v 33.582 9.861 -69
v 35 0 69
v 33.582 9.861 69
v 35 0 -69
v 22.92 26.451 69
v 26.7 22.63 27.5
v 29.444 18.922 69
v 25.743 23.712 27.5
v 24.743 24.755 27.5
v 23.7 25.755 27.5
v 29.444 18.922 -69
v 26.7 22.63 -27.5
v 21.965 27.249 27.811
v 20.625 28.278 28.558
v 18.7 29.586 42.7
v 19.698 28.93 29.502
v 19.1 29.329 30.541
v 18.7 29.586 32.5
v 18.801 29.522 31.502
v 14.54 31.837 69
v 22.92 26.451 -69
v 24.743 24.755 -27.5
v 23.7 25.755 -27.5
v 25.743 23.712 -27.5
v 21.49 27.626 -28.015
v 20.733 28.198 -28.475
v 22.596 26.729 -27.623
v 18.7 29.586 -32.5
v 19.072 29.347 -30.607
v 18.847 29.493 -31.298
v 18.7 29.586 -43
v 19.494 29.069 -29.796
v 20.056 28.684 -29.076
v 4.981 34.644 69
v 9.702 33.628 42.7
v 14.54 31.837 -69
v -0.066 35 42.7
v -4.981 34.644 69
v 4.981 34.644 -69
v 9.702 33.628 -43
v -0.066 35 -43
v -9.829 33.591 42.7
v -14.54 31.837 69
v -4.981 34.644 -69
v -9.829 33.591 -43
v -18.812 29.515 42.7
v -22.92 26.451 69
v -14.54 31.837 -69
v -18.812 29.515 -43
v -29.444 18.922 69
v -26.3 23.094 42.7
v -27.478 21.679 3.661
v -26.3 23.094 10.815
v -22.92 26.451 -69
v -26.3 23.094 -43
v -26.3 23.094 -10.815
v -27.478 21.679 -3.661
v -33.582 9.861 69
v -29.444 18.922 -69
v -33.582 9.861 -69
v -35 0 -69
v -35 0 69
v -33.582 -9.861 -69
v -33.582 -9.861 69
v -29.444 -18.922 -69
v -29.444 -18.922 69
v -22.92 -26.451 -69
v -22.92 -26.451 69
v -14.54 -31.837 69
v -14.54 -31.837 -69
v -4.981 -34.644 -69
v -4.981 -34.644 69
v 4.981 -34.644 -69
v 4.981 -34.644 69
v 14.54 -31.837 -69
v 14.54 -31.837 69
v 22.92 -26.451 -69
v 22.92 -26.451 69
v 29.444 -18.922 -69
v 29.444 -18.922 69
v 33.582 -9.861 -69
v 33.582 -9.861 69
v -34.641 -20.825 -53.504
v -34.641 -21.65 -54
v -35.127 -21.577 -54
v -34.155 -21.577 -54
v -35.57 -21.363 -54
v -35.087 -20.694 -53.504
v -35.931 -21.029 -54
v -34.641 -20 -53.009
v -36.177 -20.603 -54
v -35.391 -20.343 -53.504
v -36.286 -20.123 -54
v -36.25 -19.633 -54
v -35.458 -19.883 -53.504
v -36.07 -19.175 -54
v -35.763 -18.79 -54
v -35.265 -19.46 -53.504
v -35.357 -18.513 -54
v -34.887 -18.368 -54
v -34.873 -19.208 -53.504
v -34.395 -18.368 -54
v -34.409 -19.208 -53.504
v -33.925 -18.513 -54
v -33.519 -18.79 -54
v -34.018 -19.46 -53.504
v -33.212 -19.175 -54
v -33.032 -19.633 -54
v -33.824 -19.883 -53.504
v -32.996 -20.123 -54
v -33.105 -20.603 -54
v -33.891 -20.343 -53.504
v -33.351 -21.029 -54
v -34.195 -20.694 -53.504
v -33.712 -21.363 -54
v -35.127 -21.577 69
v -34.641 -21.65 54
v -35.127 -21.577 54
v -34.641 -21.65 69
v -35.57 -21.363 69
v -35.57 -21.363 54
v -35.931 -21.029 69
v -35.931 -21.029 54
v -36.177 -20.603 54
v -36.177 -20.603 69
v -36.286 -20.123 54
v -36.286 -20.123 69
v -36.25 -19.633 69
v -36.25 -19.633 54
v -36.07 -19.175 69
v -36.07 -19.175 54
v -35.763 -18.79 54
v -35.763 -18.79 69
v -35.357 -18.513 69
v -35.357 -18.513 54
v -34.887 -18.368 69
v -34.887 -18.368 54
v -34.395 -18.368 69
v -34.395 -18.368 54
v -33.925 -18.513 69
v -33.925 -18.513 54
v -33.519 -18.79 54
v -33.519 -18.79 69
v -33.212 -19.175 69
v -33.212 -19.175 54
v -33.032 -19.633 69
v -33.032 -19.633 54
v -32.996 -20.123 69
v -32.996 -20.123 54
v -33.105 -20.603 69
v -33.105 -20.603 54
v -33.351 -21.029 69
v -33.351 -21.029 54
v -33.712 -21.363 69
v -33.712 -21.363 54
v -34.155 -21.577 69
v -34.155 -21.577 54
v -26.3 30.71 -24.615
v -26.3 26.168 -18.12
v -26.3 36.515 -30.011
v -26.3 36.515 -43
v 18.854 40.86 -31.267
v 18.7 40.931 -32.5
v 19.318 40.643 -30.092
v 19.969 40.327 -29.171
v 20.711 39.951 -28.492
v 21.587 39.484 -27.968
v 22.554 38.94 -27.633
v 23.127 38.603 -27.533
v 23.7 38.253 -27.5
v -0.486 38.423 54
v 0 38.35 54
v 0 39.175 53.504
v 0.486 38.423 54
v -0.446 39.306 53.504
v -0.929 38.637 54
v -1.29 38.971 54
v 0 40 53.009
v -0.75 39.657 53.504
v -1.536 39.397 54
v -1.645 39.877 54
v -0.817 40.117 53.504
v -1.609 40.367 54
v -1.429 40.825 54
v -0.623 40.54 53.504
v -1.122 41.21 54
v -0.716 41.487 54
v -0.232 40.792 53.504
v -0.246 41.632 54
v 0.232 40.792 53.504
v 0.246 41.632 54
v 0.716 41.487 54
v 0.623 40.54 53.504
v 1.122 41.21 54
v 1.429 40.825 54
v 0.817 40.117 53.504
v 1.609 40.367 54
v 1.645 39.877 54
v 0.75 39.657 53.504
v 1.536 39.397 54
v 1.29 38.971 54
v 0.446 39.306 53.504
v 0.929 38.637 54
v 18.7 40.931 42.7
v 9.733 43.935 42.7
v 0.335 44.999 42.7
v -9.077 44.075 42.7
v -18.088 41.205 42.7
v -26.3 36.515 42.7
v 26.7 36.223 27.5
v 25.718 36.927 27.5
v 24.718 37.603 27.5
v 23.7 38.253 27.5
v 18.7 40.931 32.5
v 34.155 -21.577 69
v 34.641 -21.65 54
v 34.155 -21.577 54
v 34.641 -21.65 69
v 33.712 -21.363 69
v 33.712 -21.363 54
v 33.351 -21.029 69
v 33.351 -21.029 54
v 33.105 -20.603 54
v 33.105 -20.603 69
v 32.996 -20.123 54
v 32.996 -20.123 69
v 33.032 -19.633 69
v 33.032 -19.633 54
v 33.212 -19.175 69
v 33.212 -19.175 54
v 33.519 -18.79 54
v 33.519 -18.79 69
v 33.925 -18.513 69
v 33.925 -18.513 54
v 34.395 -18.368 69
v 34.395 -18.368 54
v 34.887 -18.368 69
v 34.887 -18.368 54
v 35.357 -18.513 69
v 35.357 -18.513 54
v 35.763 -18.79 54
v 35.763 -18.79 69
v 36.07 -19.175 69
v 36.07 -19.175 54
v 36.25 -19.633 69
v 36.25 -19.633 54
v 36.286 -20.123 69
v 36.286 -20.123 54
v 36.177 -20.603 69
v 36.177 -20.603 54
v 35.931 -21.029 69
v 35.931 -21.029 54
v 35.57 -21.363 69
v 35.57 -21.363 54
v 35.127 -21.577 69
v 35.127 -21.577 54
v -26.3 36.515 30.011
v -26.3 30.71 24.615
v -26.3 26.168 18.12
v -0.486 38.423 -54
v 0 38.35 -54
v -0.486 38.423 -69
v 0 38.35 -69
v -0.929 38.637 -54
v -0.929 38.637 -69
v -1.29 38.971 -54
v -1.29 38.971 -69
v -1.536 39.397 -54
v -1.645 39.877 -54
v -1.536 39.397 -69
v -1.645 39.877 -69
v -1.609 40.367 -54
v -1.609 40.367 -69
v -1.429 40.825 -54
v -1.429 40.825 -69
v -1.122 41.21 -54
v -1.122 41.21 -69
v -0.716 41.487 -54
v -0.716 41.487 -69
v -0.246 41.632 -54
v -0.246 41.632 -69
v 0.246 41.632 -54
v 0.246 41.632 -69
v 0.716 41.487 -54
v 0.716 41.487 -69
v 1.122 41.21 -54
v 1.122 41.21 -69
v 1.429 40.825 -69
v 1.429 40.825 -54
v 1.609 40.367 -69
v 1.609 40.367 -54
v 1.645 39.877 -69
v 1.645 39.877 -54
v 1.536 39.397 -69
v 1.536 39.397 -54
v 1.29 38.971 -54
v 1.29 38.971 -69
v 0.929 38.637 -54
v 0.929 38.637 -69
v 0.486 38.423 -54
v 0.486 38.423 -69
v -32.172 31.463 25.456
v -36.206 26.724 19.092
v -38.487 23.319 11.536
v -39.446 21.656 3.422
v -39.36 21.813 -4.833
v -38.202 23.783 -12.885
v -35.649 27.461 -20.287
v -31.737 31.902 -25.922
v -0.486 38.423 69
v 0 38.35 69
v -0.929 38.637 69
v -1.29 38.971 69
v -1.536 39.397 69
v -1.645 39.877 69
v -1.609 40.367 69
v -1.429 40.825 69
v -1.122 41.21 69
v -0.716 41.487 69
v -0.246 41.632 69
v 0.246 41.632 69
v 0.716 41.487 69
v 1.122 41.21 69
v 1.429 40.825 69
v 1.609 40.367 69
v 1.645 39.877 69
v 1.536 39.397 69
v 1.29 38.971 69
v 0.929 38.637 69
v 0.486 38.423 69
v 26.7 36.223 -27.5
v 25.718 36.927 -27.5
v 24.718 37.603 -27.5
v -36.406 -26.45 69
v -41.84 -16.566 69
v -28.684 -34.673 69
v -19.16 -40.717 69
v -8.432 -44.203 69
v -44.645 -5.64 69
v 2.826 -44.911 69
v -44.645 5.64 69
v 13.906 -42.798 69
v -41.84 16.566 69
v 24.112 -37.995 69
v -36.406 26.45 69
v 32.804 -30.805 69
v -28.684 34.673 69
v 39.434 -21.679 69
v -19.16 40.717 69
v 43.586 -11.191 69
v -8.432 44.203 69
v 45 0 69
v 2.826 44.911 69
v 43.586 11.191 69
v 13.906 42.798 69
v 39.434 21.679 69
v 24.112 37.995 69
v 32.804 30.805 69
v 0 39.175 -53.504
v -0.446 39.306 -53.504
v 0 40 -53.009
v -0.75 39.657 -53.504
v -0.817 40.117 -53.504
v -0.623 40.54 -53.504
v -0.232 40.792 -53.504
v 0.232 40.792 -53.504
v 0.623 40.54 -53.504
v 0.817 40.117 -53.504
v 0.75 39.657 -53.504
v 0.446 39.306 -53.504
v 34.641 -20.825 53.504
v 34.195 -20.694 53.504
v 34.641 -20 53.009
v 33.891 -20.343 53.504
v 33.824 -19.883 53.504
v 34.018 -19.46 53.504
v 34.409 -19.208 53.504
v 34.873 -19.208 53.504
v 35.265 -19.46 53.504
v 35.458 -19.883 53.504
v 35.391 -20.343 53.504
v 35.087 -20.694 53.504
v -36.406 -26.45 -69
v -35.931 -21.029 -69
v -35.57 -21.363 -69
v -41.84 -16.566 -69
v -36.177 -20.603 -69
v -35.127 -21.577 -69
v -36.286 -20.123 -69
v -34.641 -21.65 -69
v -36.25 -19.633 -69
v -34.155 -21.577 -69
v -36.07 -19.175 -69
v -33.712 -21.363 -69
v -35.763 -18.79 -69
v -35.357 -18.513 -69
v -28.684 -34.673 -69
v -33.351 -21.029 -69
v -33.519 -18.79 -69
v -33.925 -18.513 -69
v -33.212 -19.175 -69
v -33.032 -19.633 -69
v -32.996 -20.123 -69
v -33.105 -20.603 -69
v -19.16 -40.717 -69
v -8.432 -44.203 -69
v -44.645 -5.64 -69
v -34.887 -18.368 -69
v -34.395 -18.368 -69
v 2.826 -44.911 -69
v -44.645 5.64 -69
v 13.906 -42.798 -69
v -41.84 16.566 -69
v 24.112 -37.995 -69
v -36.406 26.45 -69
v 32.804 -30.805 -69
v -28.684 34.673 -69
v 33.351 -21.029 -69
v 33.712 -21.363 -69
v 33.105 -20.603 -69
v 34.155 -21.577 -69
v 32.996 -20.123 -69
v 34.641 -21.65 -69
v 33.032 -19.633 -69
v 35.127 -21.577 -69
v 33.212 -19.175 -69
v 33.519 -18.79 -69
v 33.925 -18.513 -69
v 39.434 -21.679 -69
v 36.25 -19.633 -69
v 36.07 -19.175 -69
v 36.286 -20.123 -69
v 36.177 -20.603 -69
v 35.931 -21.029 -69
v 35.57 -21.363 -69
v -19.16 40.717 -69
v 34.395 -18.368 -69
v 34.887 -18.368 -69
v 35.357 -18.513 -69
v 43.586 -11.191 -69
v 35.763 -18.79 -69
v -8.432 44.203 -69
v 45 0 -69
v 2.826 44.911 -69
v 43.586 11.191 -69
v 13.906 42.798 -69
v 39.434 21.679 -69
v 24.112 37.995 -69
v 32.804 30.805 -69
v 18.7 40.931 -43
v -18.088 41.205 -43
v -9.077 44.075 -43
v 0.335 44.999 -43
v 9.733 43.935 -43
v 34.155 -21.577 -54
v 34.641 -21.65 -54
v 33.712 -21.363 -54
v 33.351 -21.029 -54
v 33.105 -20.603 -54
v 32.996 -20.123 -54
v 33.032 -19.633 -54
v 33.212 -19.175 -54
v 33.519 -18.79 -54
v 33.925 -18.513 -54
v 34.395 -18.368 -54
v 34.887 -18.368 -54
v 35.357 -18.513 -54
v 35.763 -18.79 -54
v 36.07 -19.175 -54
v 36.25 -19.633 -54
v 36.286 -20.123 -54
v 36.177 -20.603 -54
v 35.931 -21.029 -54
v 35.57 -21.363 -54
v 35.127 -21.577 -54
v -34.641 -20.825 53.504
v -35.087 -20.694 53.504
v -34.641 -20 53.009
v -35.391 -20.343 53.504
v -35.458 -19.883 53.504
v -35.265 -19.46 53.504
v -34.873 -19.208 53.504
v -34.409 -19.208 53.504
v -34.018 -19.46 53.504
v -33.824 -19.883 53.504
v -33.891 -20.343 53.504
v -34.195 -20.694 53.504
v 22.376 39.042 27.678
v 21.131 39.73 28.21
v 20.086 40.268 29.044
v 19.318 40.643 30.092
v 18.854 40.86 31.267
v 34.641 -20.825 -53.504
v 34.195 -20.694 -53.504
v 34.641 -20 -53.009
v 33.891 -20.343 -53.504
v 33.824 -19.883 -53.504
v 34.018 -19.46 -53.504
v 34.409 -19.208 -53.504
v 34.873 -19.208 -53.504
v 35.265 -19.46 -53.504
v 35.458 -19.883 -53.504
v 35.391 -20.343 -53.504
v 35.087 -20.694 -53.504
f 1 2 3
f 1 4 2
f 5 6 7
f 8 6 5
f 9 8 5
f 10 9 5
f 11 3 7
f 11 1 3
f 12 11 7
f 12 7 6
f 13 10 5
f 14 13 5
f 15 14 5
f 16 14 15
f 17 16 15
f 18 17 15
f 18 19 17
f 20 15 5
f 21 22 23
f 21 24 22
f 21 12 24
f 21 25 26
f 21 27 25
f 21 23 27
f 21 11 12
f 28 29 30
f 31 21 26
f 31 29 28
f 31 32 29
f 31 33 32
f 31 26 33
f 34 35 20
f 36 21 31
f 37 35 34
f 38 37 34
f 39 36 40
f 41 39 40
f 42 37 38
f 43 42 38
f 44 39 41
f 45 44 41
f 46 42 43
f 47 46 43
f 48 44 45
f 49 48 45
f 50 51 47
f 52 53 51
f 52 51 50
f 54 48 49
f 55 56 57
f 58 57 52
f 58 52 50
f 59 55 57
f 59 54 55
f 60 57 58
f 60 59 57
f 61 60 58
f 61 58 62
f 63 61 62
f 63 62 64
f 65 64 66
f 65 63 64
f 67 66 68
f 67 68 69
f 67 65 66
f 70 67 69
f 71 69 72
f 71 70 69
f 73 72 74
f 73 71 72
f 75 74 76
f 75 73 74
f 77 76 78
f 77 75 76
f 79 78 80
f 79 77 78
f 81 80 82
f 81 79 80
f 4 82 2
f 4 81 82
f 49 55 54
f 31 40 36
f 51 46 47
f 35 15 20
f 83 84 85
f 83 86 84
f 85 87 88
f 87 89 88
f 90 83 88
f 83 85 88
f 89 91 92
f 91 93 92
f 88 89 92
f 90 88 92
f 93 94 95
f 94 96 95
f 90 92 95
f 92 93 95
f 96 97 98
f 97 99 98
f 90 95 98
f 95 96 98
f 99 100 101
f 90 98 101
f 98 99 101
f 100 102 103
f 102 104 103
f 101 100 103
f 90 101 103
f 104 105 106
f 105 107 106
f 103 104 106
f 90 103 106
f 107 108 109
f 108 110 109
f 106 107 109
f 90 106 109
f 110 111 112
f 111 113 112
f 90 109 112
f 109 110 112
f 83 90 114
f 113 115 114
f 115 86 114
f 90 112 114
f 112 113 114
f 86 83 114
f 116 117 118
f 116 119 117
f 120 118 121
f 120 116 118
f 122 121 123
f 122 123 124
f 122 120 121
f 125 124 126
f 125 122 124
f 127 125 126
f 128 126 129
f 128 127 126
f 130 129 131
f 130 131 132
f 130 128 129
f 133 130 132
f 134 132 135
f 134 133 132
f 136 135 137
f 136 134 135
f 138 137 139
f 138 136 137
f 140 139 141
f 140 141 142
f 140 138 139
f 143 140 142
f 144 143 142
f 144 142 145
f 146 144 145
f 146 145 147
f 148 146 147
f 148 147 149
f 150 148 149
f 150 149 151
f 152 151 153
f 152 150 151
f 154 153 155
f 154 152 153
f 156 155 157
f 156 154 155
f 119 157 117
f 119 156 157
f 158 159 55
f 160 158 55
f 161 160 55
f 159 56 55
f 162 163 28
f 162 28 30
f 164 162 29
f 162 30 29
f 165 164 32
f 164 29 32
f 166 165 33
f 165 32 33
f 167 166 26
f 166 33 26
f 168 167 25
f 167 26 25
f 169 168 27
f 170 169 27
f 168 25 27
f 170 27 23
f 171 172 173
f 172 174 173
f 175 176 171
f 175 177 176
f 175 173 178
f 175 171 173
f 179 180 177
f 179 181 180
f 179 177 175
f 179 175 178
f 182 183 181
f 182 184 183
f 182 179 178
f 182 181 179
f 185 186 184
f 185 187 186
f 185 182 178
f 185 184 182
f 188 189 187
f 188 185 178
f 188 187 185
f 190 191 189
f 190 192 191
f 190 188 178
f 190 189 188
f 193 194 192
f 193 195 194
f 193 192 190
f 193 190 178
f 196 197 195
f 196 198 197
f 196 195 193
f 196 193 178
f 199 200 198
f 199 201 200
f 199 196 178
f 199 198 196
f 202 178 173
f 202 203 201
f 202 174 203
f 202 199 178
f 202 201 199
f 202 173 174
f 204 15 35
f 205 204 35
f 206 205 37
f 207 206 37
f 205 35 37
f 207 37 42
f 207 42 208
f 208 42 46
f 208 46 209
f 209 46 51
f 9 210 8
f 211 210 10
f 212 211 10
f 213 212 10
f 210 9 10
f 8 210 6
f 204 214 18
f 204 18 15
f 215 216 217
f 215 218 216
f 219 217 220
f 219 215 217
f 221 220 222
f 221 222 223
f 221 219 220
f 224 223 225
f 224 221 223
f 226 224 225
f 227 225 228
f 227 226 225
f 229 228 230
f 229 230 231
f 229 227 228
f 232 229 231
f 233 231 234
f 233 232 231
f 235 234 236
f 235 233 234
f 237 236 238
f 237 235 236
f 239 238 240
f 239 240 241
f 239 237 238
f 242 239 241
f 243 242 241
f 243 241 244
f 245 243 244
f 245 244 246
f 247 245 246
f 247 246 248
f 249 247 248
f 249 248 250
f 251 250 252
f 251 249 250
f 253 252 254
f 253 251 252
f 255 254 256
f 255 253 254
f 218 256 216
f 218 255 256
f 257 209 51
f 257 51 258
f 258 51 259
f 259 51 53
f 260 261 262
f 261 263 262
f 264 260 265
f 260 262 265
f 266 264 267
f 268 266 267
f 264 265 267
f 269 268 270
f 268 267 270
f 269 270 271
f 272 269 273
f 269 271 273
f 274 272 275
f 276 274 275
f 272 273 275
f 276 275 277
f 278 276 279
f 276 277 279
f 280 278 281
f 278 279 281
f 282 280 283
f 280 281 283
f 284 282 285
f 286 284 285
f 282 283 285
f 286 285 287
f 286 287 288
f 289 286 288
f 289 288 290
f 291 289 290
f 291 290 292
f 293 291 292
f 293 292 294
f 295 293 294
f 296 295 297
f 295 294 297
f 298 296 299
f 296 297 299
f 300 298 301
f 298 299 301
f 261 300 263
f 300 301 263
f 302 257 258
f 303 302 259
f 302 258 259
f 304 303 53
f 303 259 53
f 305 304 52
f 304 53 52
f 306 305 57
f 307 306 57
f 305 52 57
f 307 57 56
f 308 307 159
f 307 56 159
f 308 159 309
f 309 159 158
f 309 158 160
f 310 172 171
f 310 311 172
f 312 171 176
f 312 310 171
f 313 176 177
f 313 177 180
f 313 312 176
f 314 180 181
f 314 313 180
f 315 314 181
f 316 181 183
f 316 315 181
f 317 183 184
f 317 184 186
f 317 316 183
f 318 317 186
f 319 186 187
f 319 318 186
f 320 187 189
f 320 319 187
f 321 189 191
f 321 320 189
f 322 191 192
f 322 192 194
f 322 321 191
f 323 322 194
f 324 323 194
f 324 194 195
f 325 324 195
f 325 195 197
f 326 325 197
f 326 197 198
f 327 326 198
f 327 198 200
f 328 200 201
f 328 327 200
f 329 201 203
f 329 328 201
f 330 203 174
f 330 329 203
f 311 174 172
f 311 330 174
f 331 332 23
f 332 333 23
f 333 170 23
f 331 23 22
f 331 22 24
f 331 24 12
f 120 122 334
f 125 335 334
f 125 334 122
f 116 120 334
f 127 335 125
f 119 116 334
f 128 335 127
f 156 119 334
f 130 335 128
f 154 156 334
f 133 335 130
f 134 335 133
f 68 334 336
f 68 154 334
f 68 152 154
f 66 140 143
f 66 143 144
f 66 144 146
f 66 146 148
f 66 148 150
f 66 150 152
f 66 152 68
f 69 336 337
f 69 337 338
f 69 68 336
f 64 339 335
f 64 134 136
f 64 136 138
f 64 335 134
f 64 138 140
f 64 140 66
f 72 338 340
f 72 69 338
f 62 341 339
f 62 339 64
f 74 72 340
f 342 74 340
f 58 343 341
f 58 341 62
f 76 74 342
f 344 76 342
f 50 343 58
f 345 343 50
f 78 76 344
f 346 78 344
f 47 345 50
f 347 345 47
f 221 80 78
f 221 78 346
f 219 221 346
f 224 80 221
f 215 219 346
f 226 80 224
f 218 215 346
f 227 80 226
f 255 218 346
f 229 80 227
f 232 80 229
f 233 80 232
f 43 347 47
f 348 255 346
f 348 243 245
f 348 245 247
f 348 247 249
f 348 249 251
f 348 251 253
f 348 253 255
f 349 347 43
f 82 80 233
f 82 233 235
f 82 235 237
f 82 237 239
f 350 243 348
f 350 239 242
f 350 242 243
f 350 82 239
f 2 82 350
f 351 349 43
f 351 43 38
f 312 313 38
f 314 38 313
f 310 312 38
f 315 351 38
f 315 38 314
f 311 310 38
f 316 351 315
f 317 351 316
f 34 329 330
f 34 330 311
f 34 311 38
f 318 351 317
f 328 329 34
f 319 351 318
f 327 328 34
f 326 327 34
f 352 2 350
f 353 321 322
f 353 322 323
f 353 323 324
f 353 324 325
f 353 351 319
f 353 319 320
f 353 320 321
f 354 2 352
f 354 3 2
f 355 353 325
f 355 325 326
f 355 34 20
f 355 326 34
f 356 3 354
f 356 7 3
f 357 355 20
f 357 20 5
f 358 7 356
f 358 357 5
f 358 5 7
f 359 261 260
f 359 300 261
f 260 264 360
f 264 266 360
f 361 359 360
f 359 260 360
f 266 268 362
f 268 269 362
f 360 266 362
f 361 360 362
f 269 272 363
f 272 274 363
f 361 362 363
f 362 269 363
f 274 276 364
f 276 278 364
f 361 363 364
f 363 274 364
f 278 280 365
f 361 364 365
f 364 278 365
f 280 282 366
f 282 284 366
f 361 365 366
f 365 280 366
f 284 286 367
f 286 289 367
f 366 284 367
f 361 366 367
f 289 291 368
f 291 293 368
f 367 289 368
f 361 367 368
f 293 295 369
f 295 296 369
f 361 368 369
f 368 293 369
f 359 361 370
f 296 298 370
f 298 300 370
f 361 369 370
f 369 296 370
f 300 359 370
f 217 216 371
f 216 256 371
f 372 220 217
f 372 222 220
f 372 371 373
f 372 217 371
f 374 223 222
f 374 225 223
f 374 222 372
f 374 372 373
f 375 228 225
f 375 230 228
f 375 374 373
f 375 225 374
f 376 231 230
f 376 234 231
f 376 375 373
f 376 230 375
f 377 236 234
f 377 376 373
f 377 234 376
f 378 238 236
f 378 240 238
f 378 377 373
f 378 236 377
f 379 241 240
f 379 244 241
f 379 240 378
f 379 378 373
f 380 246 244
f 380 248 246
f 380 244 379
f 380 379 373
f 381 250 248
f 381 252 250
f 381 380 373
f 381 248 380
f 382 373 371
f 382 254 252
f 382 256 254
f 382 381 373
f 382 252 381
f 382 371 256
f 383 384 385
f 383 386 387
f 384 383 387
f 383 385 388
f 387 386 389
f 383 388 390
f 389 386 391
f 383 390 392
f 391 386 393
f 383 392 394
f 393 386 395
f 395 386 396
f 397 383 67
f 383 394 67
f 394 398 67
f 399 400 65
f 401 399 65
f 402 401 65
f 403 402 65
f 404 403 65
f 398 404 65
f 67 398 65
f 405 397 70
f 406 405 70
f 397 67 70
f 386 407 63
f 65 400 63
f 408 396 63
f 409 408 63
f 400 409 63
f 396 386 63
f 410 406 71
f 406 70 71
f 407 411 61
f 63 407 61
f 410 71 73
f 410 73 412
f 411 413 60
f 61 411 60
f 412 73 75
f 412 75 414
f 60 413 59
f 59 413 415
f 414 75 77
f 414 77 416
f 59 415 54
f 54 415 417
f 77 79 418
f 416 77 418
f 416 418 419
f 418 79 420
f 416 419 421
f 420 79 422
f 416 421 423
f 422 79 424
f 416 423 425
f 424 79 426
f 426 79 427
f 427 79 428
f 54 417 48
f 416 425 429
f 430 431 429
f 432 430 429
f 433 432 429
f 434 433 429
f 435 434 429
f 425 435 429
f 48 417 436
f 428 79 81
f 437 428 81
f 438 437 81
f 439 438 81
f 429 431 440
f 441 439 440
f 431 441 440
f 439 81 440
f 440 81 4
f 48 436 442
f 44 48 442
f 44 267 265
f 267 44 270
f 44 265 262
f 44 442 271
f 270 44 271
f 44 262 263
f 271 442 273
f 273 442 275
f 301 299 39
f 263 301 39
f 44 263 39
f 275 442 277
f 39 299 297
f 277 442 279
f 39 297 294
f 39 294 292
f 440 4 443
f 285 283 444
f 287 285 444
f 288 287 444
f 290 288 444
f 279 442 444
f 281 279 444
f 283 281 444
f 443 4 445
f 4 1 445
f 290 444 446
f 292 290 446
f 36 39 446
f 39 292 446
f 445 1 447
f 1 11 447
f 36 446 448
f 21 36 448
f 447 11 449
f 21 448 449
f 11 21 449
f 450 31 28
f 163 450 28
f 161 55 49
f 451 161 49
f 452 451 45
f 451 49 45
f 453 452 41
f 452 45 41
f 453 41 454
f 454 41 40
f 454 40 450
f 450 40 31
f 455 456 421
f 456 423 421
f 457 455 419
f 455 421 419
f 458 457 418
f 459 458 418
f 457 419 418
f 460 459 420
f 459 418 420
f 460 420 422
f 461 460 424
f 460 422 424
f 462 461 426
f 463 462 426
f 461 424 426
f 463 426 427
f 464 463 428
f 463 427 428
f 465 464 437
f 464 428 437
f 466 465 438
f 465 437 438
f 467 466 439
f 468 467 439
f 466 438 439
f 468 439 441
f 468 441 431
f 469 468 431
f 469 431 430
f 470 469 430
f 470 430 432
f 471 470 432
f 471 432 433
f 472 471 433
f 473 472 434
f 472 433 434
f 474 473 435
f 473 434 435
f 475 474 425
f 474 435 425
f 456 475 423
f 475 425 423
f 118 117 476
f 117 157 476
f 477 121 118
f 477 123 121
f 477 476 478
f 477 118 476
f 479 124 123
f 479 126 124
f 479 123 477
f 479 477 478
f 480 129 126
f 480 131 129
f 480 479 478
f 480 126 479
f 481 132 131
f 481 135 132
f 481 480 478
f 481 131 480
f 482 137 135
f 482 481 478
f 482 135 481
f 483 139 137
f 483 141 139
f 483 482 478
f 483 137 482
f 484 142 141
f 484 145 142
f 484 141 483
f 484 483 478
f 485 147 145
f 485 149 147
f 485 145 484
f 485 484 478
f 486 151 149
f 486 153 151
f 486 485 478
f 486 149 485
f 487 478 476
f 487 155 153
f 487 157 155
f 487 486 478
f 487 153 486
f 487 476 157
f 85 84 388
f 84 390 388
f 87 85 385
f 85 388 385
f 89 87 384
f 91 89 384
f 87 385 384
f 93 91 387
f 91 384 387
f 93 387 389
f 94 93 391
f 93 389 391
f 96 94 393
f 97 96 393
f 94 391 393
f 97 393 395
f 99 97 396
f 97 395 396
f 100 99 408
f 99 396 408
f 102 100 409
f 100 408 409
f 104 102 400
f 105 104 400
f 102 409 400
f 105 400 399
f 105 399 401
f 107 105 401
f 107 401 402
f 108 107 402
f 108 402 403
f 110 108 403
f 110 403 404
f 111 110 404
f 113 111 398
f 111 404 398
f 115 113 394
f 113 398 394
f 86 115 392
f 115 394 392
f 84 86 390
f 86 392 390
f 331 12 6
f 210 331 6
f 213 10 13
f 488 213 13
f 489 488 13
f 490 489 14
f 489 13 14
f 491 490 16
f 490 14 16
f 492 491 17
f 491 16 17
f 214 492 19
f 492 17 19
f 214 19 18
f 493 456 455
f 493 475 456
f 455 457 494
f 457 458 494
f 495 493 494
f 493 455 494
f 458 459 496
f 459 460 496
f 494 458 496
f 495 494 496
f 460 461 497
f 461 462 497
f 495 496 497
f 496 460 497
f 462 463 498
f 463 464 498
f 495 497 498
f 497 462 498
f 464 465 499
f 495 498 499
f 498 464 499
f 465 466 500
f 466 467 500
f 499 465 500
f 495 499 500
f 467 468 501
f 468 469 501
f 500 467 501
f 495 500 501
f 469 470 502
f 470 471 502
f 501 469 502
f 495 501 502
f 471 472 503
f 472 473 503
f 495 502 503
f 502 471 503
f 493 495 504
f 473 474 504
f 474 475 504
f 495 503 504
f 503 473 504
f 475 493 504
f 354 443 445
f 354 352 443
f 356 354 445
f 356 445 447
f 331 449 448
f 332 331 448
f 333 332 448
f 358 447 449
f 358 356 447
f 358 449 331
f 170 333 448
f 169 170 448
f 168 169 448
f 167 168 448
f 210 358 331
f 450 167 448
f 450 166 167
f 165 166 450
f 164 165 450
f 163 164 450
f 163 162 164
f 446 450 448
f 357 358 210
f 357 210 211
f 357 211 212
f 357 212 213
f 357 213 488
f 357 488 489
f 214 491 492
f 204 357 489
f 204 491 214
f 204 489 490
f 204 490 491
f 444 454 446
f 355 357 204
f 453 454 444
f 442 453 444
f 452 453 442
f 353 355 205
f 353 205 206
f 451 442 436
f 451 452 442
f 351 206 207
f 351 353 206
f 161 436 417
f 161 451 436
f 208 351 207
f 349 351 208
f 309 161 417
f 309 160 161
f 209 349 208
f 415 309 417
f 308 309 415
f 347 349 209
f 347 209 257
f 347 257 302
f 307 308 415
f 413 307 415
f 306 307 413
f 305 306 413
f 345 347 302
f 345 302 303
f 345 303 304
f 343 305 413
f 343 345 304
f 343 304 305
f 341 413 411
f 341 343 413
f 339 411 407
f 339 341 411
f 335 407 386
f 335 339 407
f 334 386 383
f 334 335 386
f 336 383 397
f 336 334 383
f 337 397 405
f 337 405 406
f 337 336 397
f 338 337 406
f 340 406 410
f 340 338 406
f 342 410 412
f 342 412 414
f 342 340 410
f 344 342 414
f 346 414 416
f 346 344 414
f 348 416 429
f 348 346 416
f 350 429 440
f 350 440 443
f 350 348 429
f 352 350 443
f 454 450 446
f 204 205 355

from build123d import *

# Parameters (mm, degrees)
CROQUIS1_R                     = 45
CROQUIS1_R_2                   = 35
SALIENTE_EXTRUIR1_DEPTH        = 69
CORTAR_EXTRUIR1_DEPTH          = 138
CROQUIS3_R                     = 37.5
CORTAR_EXTRUIR2_DEPTH          = 138
TALADRO_ROSCADO_M41_AT_2_COUNT = 2
TALADRO_ROSCADO_M41_AT_2_PITCH = 69.282032303
TALADRO_ROSCADO_M41_AT_3_COUNT = 2
TALADRO_ROSCADO_M41_AT_3_PITCH = 69.282032303


with BuildPart() as part:
    # Croquis1 → Saliente-Extruir1 (new body, symmetric)
    with BuildSketch(Plane.XY):
        Circle(CROQUIS1_R)
        Circle(CROQUIS1_R_2, mode=Mode.SUBTRACT)
    extrude(amount=SALIENTE_EXTRUIR1_DEPTH, both=True)

    # Croquis2 → Cortar-Extruir1 (cut)
    with BuildSketch(Plane(origin=(0, 0, 0), x_dir=(1, 0, 0), z_dir=(0, 1, 0))):
        with BuildLine():
            Line((-26.3, 43), (18.7, 43))
            Line((18.7, 43), (18.7, 32.5))
            ThreePointArc((18.7, 32.5), (20.164466094, 28.964466094), (23.7, 27.5))
            Line((23.7, 27.5), (26.7, 27.5))
            Line((26.7, 27.5), (26.7, -27.5))
            Line((26.7, -27.5), (23.7, -27.5))
            ThreePointArc((23.7, -27.5), (20.164466094, -28.964466094), (18.7, -32.5))
            Line((18.7, -32.5), (18.7, -42.7))
            Line((18.7, -42.7), (-26.3, -42.7))
            Line((-26.3, -42.7), (-26.3, 43))
        make_face()
    extrude(amount=CORTAR_EXTRUIR1_DEPTH, mode=Mode.SUBTRACT)

    # Croquis3 → Cortar-Extruir2 (cut)
    with BuildSketch(Plane(origin=(0, 0, 0), x_dir=(0, 0, -1), z_dir=(1, 0, 0))):
        with Locations((0, 59)):
            Circle(CROQUIS3_R)
    extrude(amount=-CORTAR_EXTRUIR2_DEPTH, mode=Mode.SUBTRACT)

    # Croquis5 → Taladro roscado M41 (revolve, cut)
    with BuildSketch(Plane(origin=(0, 40, 69), x_dir=(0, -1, 0), z_dir=(1, 0, 0))):
        Polygon((0, 0), (0, 15.991420021), (1.65, 15), (1.65, 0), align=None)
    taladro_roscado_m41 = revolve(axis=Axis((0, 40, 75.35), (0, 0, -1)), mode=Mode.SUBTRACT)

    # Taladro roscado M41 at 2: Taladro roscado M41 ×2
    with Locations(*[Vector(0.5, -0.866025404, 0) * (i * TALADRO_ROSCADO_M41_AT_2_PITCH) for i in range(1, TALADRO_ROSCADO_M41_AT_2_COUNT)]):
        add(taladro_roscado_m41, mode=Mode.SUBTRACT)

    # Taladro roscado M41 at 3: Taladro roscado M41 ×2
    with Locations(*[Vector(-0.5, -0.866025404, 0) * (i * TALADRO_ROSCADO_M41_AT_3_PITCH) for i in range(1, TALADRO_ROSCADO_M41_AT_3_COUNT)]):
        add(taladro_roscado_m41, mode=Mode.SUBTRACT)

    # Simetría1: Taladro roscado M41 across plane
    add(taladro_roscado_m41.mirror(Plane.XY), mode=Mode.SUBTRACT)

    # Simetría1 copy 1 sketch → Simetría1 copy 1 (revolve, cut)
    with BuildSketch(Plane(origin=(34.641016151, -20, -69), x_dir=(0, -1, 0), z_dir=(1, 0, 0))):
        Polygon((0, 0), (0, -15.991420021), (1.65, -15), (1.65, 0), align=None)
    revolve(axis=Axis((34.641016151, -20, -75.35), (0, 0, -1)), mode=Mode.SUBTRACT)

    # Simetría1 copy 2 sketch → Simetría1 copy 2 (revolve, cut)
    with BuildSketch(Plane(origin=(-34.641016151, -20, -69), x_dir=(0, -1, 0), z_dir=(1, 0, 0))):
        Polygon((0, 0), (0, -15.991420021), (1.65, -15), (1.65, 0), align=None)
    revolve(axis=Axis((-34.641016151, -20, -75.35), (0, 0, -1)), mode=Mode.SUBTRACT)


solid = part.part
